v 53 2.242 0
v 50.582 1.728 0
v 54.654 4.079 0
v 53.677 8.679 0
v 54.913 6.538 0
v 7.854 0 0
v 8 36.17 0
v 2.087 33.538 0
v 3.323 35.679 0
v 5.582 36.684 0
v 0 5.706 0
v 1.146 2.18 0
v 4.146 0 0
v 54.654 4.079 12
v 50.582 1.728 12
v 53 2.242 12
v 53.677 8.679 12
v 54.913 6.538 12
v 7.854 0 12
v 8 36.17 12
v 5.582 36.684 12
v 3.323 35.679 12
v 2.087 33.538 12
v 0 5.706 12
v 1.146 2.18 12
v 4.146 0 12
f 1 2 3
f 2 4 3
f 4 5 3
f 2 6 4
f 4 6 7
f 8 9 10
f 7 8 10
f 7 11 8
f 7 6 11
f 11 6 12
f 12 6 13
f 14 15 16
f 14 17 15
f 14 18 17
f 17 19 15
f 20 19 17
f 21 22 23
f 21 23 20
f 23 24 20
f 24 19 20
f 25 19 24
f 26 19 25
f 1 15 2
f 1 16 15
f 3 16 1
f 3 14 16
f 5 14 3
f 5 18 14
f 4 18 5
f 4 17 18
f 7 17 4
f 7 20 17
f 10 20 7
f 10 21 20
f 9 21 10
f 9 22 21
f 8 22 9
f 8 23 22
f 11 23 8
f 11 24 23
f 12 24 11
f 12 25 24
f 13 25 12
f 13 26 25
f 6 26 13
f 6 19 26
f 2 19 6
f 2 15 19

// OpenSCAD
$fn = 32;

// ----------------------------------------------------------------------
// Lever arm: two bosses 12 and 8 mm, 45 mm between centres
// ----------------------------------------------------------------------

// --- parameters (mm) ---
profile_height = 12;      // extrusion height
profile_points = 13;      // points of the closed outline

profile = [[0, 5.706], [1.146, 2.18], [4.146, 0], [7.854, 0], [50.582, 1.728], [53, 2.242], [54.654, 4.079], [54.913, 6.538], [53.677, 8.679], [8, 36.17], [5.582, 36.684], [3.323, 35.679], [2.087, 33.538]];  // single closed polygon, 13 points, counter clockwise

// --- the one profile operation ---
linear_extrude(height = profile_height) polygon(points = profile);
